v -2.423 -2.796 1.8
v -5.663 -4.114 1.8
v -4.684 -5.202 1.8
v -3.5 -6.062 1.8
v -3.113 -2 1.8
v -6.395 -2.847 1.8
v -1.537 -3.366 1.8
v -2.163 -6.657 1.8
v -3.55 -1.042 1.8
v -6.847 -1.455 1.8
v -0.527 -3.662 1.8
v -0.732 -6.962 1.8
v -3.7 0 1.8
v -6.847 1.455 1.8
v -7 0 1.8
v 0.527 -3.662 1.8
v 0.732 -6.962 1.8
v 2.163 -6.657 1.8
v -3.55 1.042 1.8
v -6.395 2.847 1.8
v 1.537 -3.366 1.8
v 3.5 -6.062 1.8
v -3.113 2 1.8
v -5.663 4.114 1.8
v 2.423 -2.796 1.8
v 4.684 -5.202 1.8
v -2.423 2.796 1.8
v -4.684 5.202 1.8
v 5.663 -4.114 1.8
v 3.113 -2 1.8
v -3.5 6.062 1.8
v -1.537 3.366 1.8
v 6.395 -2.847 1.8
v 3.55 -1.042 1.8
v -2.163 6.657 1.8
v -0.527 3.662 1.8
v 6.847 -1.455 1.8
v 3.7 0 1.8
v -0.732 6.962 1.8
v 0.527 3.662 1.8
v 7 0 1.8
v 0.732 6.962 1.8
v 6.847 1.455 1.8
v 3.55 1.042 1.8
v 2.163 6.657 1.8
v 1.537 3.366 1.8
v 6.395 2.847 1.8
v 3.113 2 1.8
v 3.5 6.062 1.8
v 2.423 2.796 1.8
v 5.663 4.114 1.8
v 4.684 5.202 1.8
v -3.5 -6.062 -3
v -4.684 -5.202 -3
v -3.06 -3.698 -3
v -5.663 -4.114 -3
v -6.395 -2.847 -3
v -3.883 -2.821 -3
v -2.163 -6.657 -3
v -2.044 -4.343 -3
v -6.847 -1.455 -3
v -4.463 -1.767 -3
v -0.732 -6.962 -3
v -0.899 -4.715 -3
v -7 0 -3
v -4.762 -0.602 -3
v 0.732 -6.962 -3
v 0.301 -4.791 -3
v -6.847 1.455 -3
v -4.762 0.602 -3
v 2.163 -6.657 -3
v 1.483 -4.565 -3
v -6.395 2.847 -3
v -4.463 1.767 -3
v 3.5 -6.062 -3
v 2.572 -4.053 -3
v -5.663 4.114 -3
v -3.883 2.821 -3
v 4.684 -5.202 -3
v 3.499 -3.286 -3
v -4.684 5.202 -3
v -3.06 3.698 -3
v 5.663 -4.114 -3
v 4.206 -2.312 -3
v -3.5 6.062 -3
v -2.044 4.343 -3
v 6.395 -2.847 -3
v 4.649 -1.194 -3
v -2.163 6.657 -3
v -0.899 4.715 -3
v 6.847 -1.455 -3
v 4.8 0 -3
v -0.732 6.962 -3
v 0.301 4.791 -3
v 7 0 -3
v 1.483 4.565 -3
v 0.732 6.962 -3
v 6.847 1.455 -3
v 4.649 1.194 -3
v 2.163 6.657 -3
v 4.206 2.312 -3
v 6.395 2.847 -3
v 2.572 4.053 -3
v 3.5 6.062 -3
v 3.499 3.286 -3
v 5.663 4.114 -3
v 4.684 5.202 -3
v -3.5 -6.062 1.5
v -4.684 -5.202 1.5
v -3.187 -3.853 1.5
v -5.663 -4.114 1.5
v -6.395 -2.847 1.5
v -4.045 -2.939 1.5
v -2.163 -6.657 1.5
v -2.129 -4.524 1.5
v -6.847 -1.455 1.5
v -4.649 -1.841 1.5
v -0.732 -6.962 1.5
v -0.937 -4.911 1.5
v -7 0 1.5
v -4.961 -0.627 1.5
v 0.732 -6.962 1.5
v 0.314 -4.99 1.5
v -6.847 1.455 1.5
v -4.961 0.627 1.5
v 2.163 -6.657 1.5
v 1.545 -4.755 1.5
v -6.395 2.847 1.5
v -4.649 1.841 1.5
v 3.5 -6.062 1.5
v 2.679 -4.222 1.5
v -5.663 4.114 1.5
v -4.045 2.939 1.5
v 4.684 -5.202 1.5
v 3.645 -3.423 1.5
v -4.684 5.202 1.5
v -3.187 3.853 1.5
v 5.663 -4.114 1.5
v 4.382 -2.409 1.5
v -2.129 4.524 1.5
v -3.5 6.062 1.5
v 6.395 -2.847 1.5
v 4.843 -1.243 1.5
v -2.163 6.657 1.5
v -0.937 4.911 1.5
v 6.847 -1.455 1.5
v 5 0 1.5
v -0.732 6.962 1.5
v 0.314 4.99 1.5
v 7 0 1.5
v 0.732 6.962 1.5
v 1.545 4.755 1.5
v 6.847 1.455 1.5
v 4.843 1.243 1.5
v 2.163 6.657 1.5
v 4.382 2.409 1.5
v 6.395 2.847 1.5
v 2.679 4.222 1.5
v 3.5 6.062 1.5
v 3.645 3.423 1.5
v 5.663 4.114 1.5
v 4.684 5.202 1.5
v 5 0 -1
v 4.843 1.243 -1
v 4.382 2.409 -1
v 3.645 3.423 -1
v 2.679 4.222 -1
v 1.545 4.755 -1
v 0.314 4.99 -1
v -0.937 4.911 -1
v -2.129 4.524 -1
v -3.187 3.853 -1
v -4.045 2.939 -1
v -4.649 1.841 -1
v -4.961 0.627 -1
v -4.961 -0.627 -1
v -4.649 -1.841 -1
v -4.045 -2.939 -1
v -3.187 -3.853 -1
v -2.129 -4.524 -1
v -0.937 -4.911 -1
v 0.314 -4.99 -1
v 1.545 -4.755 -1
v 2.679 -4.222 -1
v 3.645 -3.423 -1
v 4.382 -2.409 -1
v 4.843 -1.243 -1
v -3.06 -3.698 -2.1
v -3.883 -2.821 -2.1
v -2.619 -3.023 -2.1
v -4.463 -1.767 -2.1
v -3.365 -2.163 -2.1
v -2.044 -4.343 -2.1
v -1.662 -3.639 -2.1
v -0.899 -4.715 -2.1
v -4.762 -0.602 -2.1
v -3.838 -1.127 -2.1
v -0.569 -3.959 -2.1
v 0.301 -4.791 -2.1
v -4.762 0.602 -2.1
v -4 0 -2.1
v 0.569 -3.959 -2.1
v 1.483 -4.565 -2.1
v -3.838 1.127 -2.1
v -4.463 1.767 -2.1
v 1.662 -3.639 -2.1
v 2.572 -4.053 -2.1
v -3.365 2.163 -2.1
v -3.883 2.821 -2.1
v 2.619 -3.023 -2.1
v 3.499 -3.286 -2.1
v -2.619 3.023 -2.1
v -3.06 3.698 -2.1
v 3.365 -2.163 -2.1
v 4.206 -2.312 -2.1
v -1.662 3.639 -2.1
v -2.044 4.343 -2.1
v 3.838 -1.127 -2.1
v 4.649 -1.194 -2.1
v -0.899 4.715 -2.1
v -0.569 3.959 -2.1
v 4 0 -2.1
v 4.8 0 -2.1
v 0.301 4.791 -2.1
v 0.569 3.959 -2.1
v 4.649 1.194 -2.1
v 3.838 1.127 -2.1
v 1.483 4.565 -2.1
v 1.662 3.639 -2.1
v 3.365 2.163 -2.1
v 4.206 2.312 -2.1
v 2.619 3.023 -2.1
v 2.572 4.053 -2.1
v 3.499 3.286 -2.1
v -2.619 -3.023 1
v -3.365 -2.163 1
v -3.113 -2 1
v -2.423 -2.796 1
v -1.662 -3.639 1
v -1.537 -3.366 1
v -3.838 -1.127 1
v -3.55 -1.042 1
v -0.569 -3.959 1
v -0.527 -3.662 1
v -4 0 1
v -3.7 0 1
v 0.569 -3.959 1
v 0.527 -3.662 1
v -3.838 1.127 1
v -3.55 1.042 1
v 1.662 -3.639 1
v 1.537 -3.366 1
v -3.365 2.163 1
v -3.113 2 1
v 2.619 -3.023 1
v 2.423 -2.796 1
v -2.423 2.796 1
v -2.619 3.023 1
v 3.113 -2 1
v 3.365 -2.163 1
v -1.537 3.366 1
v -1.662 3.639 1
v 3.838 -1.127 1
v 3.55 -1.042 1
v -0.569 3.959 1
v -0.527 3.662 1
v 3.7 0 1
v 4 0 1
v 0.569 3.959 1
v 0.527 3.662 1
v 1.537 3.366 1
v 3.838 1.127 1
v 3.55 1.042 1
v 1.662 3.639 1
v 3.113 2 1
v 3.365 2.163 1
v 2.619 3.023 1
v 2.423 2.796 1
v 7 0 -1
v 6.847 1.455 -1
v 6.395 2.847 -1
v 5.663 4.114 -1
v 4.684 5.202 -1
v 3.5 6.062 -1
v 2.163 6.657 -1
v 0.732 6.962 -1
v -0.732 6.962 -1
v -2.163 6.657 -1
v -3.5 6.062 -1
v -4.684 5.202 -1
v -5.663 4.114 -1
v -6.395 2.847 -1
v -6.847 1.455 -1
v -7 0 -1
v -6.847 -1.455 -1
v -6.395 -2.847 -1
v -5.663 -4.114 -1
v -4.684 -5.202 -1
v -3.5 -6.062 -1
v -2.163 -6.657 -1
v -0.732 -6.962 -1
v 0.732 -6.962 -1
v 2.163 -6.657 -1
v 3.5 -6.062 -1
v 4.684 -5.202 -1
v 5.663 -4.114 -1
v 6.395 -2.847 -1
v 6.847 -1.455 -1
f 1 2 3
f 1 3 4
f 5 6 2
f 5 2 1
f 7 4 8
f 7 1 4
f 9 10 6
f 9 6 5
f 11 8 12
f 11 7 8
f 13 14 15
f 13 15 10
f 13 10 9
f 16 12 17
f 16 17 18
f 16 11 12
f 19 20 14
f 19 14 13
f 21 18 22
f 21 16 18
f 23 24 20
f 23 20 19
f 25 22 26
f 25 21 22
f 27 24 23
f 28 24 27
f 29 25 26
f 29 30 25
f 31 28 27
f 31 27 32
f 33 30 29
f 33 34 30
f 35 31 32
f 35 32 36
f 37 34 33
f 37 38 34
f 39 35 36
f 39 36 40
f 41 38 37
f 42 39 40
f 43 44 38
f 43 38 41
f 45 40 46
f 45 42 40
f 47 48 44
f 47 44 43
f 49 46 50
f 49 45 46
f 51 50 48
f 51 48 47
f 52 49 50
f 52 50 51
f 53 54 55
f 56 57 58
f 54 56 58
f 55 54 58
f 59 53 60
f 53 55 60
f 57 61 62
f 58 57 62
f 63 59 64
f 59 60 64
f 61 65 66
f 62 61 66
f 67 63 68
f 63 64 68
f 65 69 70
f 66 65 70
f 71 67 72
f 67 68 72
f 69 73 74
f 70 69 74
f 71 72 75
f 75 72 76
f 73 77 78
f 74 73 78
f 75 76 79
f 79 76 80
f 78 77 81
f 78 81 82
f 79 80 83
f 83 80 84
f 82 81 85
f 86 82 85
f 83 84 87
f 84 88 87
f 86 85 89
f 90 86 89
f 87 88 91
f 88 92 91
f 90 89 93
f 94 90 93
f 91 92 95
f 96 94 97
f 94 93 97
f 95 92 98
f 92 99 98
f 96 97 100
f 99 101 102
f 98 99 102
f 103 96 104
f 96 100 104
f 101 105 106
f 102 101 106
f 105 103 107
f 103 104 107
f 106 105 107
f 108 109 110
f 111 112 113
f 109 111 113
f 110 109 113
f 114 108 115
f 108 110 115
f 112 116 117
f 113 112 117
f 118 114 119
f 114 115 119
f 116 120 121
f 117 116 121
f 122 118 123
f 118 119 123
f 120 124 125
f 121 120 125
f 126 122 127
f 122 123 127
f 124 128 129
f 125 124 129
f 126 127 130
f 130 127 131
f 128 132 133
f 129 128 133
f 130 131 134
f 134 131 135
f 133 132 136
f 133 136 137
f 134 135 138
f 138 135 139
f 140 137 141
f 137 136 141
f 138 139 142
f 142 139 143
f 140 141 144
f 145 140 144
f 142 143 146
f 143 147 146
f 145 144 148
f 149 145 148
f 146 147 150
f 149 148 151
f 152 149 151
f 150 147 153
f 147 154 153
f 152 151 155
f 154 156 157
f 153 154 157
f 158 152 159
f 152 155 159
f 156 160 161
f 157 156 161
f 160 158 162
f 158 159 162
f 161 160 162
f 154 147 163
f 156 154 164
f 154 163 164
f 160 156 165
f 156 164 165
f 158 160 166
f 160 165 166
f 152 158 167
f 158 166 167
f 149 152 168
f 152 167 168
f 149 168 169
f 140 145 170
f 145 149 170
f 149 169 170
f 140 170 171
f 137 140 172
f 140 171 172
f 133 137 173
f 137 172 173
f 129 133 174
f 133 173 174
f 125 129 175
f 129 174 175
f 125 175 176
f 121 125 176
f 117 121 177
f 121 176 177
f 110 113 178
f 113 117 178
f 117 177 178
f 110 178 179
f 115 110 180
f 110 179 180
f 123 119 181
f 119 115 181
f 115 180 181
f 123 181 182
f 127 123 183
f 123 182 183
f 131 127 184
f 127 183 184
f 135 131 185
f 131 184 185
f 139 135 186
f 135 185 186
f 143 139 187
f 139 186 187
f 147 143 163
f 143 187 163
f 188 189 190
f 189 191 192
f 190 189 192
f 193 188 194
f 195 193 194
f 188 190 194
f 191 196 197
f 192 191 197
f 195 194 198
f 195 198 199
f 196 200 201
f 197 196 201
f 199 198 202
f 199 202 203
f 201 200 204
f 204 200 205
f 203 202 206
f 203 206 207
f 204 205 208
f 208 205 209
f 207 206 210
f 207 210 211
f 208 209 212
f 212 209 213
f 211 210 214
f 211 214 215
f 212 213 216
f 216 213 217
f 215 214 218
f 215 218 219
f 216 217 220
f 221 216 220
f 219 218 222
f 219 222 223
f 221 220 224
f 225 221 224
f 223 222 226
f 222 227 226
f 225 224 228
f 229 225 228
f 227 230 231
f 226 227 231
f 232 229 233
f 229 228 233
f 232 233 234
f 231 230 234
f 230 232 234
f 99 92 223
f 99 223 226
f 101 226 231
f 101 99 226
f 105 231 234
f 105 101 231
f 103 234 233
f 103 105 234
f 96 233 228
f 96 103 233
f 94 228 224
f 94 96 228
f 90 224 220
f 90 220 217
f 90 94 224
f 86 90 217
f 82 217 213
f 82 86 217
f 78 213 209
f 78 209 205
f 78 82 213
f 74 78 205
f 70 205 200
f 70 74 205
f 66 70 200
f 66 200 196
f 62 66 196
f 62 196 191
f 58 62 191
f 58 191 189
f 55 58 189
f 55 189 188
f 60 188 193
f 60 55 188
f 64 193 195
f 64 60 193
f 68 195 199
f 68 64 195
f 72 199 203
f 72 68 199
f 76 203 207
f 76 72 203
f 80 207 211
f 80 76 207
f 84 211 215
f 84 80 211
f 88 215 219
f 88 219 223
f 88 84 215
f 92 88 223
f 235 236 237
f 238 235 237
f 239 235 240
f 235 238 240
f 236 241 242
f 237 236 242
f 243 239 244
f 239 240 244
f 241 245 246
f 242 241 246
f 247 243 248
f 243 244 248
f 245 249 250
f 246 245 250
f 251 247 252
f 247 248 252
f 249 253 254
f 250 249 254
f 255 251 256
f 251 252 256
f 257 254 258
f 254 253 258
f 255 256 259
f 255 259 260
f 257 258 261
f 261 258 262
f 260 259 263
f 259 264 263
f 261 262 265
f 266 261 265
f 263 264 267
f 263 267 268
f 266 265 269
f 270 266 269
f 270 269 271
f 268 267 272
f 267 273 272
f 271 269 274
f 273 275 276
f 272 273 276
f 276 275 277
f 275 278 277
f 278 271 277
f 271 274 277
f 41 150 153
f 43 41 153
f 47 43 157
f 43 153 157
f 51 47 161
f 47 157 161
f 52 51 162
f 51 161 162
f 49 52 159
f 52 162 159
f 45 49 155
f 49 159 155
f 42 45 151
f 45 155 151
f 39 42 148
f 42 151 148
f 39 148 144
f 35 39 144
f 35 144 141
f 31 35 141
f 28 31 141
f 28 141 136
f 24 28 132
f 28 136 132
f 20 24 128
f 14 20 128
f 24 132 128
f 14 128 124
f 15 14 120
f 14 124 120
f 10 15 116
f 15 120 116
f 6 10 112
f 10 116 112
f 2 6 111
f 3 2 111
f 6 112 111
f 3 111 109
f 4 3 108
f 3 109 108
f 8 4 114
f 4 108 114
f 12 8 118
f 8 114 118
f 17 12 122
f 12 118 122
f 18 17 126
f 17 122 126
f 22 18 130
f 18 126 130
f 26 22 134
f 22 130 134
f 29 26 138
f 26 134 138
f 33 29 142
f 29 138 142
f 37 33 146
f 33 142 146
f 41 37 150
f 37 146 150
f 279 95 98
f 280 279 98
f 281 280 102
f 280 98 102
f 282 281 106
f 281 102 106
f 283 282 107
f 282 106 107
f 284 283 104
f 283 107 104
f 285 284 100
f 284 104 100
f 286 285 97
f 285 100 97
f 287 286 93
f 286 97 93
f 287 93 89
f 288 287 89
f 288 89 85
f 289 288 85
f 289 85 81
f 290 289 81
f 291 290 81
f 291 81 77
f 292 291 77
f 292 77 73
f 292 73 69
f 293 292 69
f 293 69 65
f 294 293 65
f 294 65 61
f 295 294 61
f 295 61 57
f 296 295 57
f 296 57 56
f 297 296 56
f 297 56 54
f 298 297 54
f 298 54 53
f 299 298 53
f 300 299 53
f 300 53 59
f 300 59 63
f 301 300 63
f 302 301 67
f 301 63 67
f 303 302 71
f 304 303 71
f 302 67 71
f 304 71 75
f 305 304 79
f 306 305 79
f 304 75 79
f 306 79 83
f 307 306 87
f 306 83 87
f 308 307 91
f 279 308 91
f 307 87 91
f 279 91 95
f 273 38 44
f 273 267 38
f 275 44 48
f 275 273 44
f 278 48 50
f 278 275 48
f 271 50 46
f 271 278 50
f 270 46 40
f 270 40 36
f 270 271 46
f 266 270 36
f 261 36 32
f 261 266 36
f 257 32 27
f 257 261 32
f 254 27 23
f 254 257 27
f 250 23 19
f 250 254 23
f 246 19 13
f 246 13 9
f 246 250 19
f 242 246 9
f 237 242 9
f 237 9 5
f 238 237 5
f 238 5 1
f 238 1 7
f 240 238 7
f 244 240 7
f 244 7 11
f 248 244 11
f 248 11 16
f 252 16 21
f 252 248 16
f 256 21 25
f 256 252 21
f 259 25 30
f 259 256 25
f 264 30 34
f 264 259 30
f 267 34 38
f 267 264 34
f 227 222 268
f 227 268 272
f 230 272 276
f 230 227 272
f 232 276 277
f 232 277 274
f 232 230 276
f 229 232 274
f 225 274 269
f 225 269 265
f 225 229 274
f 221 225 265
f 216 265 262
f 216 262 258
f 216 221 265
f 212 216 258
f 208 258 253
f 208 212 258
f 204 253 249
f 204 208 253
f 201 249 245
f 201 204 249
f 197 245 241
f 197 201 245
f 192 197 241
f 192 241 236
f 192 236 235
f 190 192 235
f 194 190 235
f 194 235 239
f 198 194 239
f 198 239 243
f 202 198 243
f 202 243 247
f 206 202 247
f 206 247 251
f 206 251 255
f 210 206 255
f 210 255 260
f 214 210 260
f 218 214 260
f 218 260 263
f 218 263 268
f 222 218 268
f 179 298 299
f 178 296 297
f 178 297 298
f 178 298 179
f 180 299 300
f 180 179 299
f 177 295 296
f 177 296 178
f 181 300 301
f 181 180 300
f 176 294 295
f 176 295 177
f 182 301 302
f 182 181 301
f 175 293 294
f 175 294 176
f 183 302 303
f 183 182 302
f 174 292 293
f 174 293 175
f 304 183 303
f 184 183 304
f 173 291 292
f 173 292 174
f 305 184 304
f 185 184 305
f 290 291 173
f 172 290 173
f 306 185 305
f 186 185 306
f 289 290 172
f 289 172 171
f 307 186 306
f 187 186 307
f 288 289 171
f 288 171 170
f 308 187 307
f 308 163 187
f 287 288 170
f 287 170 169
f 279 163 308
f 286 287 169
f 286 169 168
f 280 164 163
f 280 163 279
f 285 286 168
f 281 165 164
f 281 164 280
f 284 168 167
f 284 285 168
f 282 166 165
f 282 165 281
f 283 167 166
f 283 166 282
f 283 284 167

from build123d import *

# Parameters (mm, degrees)
D10_PILOT_AND_M10X0P5_THREAD_ENVELOPE_START = -1
SKETCH1_R                                   = 5
SKETCH1_R_2                                 = 4
D10_PILOT_AND_M10X0P5_THREAD_ENVELOPE_DEPTH = 2
OUTER_RACE_INNER_SHOULDER_ID7P4_START       = 1
SKETCH2_R                                   = 5
SKETCH2_R_2                                 = 3.7
OUTER_RACE_INNER_SHOULDER_ID7P4_DEPTH       = 0.8
INBOARD_G10_RETENTION_FLANGE_H0P3_START     = 1.5
SKETCH3_R                                   = 7
SKETCH3_R_2                                 = 3.7
INBOARD_G10_RETENTION_FLANGE_H0P3_DEPTH     = 0.3
M14X0P5_BEARING_CAP_BOSS_START              = -2.1
SKETCH4_R                                   = 7
SKETCH4_R_2                                 = 4
M14X0P5_BEARING_CAP_BOSS_DEPTH              = 1.1
FLANGED_RACE_POCKET_D9P6_START              = -3
SKETCH5_R                                   = 7
SKETCH5_R_2                                 = 4.8
FLANGED_RACE_POCKET_D9P6_DEPTH              = 0.9


with BuildPart() as part:
    # Sketch1 → D10_Pilot_And_M10x0p5_Thread_Envelope (new body)
    with BuildSketch(Plane.XY.offset(D10_PILOT_AND_M10X0P5_THREAD_ENVELOPE_START)):
        Circle(SKETCH1_R)
        Circle(SKETCH1_R_2, mode=Mode.SUBTRACT)
    extrude(amount=D10_PILOT_AND_M10X0P5_THREAD_ENVELOPE_DEPTH)

    # Sketch2 → Outer_Race_Inner_Shoulder_ID7p4 (add)
    with BuildSketch(Plane.XY.offset(OUTER_RACE_INNER_SHOULDER_ID7P4_START)):
        Circle(SKETCH2_R)
        Circle(SKETCH2_R_2, mode=Mode.SUBTRACT)
    extrude(amount=OUTER_RACE_INNER_SHOULDER_ID7P4_DEPTH)

    # Sketch3 → Inboard_G10_Retention_Flange_H0p3 (add)
    with BuildSketch(Plane.XY.offset(INBOARD_G10_RETENTION_FLANGE_H0P3_START)):
        Circle(SKETCH3_R)
        Circle(SKETCH3_R_2, mode=Mode.SUBTRACT)
    extrude(amount=INBOARD_G10_RETENTION_FLANGE_H0P3_DEPTH)

    # Sketch4 → M14x0p5_Bearing_Cap_Boss (add)
    with BuildSketch(Plane.XY.offset(M14X0P5_BEARING_CAP_BOSS_START)):
        Circle(SKETCH4_R)
        Circle(SKETCH4_R_2, mode=Mode.SUBTRACT)
    extrude(amount=M14X0P5_BEARING_CAP_BOSS_DEPTH)

    # Sketch5 → Flanged_Race_Pocket_D9p6 (add)
    with BuildSketch(Plane.XY.offset(FLANGED_RACE_POCKET_D9P6_START)):
        Circle(SKETCH5_R)
        Circle(SKETCH5_R_2, mode=Mode.SUBTRACT)
    extrude(amount=FLANGED_RACE_POCKET_D9P6_DEPTH)


solid = part.part
